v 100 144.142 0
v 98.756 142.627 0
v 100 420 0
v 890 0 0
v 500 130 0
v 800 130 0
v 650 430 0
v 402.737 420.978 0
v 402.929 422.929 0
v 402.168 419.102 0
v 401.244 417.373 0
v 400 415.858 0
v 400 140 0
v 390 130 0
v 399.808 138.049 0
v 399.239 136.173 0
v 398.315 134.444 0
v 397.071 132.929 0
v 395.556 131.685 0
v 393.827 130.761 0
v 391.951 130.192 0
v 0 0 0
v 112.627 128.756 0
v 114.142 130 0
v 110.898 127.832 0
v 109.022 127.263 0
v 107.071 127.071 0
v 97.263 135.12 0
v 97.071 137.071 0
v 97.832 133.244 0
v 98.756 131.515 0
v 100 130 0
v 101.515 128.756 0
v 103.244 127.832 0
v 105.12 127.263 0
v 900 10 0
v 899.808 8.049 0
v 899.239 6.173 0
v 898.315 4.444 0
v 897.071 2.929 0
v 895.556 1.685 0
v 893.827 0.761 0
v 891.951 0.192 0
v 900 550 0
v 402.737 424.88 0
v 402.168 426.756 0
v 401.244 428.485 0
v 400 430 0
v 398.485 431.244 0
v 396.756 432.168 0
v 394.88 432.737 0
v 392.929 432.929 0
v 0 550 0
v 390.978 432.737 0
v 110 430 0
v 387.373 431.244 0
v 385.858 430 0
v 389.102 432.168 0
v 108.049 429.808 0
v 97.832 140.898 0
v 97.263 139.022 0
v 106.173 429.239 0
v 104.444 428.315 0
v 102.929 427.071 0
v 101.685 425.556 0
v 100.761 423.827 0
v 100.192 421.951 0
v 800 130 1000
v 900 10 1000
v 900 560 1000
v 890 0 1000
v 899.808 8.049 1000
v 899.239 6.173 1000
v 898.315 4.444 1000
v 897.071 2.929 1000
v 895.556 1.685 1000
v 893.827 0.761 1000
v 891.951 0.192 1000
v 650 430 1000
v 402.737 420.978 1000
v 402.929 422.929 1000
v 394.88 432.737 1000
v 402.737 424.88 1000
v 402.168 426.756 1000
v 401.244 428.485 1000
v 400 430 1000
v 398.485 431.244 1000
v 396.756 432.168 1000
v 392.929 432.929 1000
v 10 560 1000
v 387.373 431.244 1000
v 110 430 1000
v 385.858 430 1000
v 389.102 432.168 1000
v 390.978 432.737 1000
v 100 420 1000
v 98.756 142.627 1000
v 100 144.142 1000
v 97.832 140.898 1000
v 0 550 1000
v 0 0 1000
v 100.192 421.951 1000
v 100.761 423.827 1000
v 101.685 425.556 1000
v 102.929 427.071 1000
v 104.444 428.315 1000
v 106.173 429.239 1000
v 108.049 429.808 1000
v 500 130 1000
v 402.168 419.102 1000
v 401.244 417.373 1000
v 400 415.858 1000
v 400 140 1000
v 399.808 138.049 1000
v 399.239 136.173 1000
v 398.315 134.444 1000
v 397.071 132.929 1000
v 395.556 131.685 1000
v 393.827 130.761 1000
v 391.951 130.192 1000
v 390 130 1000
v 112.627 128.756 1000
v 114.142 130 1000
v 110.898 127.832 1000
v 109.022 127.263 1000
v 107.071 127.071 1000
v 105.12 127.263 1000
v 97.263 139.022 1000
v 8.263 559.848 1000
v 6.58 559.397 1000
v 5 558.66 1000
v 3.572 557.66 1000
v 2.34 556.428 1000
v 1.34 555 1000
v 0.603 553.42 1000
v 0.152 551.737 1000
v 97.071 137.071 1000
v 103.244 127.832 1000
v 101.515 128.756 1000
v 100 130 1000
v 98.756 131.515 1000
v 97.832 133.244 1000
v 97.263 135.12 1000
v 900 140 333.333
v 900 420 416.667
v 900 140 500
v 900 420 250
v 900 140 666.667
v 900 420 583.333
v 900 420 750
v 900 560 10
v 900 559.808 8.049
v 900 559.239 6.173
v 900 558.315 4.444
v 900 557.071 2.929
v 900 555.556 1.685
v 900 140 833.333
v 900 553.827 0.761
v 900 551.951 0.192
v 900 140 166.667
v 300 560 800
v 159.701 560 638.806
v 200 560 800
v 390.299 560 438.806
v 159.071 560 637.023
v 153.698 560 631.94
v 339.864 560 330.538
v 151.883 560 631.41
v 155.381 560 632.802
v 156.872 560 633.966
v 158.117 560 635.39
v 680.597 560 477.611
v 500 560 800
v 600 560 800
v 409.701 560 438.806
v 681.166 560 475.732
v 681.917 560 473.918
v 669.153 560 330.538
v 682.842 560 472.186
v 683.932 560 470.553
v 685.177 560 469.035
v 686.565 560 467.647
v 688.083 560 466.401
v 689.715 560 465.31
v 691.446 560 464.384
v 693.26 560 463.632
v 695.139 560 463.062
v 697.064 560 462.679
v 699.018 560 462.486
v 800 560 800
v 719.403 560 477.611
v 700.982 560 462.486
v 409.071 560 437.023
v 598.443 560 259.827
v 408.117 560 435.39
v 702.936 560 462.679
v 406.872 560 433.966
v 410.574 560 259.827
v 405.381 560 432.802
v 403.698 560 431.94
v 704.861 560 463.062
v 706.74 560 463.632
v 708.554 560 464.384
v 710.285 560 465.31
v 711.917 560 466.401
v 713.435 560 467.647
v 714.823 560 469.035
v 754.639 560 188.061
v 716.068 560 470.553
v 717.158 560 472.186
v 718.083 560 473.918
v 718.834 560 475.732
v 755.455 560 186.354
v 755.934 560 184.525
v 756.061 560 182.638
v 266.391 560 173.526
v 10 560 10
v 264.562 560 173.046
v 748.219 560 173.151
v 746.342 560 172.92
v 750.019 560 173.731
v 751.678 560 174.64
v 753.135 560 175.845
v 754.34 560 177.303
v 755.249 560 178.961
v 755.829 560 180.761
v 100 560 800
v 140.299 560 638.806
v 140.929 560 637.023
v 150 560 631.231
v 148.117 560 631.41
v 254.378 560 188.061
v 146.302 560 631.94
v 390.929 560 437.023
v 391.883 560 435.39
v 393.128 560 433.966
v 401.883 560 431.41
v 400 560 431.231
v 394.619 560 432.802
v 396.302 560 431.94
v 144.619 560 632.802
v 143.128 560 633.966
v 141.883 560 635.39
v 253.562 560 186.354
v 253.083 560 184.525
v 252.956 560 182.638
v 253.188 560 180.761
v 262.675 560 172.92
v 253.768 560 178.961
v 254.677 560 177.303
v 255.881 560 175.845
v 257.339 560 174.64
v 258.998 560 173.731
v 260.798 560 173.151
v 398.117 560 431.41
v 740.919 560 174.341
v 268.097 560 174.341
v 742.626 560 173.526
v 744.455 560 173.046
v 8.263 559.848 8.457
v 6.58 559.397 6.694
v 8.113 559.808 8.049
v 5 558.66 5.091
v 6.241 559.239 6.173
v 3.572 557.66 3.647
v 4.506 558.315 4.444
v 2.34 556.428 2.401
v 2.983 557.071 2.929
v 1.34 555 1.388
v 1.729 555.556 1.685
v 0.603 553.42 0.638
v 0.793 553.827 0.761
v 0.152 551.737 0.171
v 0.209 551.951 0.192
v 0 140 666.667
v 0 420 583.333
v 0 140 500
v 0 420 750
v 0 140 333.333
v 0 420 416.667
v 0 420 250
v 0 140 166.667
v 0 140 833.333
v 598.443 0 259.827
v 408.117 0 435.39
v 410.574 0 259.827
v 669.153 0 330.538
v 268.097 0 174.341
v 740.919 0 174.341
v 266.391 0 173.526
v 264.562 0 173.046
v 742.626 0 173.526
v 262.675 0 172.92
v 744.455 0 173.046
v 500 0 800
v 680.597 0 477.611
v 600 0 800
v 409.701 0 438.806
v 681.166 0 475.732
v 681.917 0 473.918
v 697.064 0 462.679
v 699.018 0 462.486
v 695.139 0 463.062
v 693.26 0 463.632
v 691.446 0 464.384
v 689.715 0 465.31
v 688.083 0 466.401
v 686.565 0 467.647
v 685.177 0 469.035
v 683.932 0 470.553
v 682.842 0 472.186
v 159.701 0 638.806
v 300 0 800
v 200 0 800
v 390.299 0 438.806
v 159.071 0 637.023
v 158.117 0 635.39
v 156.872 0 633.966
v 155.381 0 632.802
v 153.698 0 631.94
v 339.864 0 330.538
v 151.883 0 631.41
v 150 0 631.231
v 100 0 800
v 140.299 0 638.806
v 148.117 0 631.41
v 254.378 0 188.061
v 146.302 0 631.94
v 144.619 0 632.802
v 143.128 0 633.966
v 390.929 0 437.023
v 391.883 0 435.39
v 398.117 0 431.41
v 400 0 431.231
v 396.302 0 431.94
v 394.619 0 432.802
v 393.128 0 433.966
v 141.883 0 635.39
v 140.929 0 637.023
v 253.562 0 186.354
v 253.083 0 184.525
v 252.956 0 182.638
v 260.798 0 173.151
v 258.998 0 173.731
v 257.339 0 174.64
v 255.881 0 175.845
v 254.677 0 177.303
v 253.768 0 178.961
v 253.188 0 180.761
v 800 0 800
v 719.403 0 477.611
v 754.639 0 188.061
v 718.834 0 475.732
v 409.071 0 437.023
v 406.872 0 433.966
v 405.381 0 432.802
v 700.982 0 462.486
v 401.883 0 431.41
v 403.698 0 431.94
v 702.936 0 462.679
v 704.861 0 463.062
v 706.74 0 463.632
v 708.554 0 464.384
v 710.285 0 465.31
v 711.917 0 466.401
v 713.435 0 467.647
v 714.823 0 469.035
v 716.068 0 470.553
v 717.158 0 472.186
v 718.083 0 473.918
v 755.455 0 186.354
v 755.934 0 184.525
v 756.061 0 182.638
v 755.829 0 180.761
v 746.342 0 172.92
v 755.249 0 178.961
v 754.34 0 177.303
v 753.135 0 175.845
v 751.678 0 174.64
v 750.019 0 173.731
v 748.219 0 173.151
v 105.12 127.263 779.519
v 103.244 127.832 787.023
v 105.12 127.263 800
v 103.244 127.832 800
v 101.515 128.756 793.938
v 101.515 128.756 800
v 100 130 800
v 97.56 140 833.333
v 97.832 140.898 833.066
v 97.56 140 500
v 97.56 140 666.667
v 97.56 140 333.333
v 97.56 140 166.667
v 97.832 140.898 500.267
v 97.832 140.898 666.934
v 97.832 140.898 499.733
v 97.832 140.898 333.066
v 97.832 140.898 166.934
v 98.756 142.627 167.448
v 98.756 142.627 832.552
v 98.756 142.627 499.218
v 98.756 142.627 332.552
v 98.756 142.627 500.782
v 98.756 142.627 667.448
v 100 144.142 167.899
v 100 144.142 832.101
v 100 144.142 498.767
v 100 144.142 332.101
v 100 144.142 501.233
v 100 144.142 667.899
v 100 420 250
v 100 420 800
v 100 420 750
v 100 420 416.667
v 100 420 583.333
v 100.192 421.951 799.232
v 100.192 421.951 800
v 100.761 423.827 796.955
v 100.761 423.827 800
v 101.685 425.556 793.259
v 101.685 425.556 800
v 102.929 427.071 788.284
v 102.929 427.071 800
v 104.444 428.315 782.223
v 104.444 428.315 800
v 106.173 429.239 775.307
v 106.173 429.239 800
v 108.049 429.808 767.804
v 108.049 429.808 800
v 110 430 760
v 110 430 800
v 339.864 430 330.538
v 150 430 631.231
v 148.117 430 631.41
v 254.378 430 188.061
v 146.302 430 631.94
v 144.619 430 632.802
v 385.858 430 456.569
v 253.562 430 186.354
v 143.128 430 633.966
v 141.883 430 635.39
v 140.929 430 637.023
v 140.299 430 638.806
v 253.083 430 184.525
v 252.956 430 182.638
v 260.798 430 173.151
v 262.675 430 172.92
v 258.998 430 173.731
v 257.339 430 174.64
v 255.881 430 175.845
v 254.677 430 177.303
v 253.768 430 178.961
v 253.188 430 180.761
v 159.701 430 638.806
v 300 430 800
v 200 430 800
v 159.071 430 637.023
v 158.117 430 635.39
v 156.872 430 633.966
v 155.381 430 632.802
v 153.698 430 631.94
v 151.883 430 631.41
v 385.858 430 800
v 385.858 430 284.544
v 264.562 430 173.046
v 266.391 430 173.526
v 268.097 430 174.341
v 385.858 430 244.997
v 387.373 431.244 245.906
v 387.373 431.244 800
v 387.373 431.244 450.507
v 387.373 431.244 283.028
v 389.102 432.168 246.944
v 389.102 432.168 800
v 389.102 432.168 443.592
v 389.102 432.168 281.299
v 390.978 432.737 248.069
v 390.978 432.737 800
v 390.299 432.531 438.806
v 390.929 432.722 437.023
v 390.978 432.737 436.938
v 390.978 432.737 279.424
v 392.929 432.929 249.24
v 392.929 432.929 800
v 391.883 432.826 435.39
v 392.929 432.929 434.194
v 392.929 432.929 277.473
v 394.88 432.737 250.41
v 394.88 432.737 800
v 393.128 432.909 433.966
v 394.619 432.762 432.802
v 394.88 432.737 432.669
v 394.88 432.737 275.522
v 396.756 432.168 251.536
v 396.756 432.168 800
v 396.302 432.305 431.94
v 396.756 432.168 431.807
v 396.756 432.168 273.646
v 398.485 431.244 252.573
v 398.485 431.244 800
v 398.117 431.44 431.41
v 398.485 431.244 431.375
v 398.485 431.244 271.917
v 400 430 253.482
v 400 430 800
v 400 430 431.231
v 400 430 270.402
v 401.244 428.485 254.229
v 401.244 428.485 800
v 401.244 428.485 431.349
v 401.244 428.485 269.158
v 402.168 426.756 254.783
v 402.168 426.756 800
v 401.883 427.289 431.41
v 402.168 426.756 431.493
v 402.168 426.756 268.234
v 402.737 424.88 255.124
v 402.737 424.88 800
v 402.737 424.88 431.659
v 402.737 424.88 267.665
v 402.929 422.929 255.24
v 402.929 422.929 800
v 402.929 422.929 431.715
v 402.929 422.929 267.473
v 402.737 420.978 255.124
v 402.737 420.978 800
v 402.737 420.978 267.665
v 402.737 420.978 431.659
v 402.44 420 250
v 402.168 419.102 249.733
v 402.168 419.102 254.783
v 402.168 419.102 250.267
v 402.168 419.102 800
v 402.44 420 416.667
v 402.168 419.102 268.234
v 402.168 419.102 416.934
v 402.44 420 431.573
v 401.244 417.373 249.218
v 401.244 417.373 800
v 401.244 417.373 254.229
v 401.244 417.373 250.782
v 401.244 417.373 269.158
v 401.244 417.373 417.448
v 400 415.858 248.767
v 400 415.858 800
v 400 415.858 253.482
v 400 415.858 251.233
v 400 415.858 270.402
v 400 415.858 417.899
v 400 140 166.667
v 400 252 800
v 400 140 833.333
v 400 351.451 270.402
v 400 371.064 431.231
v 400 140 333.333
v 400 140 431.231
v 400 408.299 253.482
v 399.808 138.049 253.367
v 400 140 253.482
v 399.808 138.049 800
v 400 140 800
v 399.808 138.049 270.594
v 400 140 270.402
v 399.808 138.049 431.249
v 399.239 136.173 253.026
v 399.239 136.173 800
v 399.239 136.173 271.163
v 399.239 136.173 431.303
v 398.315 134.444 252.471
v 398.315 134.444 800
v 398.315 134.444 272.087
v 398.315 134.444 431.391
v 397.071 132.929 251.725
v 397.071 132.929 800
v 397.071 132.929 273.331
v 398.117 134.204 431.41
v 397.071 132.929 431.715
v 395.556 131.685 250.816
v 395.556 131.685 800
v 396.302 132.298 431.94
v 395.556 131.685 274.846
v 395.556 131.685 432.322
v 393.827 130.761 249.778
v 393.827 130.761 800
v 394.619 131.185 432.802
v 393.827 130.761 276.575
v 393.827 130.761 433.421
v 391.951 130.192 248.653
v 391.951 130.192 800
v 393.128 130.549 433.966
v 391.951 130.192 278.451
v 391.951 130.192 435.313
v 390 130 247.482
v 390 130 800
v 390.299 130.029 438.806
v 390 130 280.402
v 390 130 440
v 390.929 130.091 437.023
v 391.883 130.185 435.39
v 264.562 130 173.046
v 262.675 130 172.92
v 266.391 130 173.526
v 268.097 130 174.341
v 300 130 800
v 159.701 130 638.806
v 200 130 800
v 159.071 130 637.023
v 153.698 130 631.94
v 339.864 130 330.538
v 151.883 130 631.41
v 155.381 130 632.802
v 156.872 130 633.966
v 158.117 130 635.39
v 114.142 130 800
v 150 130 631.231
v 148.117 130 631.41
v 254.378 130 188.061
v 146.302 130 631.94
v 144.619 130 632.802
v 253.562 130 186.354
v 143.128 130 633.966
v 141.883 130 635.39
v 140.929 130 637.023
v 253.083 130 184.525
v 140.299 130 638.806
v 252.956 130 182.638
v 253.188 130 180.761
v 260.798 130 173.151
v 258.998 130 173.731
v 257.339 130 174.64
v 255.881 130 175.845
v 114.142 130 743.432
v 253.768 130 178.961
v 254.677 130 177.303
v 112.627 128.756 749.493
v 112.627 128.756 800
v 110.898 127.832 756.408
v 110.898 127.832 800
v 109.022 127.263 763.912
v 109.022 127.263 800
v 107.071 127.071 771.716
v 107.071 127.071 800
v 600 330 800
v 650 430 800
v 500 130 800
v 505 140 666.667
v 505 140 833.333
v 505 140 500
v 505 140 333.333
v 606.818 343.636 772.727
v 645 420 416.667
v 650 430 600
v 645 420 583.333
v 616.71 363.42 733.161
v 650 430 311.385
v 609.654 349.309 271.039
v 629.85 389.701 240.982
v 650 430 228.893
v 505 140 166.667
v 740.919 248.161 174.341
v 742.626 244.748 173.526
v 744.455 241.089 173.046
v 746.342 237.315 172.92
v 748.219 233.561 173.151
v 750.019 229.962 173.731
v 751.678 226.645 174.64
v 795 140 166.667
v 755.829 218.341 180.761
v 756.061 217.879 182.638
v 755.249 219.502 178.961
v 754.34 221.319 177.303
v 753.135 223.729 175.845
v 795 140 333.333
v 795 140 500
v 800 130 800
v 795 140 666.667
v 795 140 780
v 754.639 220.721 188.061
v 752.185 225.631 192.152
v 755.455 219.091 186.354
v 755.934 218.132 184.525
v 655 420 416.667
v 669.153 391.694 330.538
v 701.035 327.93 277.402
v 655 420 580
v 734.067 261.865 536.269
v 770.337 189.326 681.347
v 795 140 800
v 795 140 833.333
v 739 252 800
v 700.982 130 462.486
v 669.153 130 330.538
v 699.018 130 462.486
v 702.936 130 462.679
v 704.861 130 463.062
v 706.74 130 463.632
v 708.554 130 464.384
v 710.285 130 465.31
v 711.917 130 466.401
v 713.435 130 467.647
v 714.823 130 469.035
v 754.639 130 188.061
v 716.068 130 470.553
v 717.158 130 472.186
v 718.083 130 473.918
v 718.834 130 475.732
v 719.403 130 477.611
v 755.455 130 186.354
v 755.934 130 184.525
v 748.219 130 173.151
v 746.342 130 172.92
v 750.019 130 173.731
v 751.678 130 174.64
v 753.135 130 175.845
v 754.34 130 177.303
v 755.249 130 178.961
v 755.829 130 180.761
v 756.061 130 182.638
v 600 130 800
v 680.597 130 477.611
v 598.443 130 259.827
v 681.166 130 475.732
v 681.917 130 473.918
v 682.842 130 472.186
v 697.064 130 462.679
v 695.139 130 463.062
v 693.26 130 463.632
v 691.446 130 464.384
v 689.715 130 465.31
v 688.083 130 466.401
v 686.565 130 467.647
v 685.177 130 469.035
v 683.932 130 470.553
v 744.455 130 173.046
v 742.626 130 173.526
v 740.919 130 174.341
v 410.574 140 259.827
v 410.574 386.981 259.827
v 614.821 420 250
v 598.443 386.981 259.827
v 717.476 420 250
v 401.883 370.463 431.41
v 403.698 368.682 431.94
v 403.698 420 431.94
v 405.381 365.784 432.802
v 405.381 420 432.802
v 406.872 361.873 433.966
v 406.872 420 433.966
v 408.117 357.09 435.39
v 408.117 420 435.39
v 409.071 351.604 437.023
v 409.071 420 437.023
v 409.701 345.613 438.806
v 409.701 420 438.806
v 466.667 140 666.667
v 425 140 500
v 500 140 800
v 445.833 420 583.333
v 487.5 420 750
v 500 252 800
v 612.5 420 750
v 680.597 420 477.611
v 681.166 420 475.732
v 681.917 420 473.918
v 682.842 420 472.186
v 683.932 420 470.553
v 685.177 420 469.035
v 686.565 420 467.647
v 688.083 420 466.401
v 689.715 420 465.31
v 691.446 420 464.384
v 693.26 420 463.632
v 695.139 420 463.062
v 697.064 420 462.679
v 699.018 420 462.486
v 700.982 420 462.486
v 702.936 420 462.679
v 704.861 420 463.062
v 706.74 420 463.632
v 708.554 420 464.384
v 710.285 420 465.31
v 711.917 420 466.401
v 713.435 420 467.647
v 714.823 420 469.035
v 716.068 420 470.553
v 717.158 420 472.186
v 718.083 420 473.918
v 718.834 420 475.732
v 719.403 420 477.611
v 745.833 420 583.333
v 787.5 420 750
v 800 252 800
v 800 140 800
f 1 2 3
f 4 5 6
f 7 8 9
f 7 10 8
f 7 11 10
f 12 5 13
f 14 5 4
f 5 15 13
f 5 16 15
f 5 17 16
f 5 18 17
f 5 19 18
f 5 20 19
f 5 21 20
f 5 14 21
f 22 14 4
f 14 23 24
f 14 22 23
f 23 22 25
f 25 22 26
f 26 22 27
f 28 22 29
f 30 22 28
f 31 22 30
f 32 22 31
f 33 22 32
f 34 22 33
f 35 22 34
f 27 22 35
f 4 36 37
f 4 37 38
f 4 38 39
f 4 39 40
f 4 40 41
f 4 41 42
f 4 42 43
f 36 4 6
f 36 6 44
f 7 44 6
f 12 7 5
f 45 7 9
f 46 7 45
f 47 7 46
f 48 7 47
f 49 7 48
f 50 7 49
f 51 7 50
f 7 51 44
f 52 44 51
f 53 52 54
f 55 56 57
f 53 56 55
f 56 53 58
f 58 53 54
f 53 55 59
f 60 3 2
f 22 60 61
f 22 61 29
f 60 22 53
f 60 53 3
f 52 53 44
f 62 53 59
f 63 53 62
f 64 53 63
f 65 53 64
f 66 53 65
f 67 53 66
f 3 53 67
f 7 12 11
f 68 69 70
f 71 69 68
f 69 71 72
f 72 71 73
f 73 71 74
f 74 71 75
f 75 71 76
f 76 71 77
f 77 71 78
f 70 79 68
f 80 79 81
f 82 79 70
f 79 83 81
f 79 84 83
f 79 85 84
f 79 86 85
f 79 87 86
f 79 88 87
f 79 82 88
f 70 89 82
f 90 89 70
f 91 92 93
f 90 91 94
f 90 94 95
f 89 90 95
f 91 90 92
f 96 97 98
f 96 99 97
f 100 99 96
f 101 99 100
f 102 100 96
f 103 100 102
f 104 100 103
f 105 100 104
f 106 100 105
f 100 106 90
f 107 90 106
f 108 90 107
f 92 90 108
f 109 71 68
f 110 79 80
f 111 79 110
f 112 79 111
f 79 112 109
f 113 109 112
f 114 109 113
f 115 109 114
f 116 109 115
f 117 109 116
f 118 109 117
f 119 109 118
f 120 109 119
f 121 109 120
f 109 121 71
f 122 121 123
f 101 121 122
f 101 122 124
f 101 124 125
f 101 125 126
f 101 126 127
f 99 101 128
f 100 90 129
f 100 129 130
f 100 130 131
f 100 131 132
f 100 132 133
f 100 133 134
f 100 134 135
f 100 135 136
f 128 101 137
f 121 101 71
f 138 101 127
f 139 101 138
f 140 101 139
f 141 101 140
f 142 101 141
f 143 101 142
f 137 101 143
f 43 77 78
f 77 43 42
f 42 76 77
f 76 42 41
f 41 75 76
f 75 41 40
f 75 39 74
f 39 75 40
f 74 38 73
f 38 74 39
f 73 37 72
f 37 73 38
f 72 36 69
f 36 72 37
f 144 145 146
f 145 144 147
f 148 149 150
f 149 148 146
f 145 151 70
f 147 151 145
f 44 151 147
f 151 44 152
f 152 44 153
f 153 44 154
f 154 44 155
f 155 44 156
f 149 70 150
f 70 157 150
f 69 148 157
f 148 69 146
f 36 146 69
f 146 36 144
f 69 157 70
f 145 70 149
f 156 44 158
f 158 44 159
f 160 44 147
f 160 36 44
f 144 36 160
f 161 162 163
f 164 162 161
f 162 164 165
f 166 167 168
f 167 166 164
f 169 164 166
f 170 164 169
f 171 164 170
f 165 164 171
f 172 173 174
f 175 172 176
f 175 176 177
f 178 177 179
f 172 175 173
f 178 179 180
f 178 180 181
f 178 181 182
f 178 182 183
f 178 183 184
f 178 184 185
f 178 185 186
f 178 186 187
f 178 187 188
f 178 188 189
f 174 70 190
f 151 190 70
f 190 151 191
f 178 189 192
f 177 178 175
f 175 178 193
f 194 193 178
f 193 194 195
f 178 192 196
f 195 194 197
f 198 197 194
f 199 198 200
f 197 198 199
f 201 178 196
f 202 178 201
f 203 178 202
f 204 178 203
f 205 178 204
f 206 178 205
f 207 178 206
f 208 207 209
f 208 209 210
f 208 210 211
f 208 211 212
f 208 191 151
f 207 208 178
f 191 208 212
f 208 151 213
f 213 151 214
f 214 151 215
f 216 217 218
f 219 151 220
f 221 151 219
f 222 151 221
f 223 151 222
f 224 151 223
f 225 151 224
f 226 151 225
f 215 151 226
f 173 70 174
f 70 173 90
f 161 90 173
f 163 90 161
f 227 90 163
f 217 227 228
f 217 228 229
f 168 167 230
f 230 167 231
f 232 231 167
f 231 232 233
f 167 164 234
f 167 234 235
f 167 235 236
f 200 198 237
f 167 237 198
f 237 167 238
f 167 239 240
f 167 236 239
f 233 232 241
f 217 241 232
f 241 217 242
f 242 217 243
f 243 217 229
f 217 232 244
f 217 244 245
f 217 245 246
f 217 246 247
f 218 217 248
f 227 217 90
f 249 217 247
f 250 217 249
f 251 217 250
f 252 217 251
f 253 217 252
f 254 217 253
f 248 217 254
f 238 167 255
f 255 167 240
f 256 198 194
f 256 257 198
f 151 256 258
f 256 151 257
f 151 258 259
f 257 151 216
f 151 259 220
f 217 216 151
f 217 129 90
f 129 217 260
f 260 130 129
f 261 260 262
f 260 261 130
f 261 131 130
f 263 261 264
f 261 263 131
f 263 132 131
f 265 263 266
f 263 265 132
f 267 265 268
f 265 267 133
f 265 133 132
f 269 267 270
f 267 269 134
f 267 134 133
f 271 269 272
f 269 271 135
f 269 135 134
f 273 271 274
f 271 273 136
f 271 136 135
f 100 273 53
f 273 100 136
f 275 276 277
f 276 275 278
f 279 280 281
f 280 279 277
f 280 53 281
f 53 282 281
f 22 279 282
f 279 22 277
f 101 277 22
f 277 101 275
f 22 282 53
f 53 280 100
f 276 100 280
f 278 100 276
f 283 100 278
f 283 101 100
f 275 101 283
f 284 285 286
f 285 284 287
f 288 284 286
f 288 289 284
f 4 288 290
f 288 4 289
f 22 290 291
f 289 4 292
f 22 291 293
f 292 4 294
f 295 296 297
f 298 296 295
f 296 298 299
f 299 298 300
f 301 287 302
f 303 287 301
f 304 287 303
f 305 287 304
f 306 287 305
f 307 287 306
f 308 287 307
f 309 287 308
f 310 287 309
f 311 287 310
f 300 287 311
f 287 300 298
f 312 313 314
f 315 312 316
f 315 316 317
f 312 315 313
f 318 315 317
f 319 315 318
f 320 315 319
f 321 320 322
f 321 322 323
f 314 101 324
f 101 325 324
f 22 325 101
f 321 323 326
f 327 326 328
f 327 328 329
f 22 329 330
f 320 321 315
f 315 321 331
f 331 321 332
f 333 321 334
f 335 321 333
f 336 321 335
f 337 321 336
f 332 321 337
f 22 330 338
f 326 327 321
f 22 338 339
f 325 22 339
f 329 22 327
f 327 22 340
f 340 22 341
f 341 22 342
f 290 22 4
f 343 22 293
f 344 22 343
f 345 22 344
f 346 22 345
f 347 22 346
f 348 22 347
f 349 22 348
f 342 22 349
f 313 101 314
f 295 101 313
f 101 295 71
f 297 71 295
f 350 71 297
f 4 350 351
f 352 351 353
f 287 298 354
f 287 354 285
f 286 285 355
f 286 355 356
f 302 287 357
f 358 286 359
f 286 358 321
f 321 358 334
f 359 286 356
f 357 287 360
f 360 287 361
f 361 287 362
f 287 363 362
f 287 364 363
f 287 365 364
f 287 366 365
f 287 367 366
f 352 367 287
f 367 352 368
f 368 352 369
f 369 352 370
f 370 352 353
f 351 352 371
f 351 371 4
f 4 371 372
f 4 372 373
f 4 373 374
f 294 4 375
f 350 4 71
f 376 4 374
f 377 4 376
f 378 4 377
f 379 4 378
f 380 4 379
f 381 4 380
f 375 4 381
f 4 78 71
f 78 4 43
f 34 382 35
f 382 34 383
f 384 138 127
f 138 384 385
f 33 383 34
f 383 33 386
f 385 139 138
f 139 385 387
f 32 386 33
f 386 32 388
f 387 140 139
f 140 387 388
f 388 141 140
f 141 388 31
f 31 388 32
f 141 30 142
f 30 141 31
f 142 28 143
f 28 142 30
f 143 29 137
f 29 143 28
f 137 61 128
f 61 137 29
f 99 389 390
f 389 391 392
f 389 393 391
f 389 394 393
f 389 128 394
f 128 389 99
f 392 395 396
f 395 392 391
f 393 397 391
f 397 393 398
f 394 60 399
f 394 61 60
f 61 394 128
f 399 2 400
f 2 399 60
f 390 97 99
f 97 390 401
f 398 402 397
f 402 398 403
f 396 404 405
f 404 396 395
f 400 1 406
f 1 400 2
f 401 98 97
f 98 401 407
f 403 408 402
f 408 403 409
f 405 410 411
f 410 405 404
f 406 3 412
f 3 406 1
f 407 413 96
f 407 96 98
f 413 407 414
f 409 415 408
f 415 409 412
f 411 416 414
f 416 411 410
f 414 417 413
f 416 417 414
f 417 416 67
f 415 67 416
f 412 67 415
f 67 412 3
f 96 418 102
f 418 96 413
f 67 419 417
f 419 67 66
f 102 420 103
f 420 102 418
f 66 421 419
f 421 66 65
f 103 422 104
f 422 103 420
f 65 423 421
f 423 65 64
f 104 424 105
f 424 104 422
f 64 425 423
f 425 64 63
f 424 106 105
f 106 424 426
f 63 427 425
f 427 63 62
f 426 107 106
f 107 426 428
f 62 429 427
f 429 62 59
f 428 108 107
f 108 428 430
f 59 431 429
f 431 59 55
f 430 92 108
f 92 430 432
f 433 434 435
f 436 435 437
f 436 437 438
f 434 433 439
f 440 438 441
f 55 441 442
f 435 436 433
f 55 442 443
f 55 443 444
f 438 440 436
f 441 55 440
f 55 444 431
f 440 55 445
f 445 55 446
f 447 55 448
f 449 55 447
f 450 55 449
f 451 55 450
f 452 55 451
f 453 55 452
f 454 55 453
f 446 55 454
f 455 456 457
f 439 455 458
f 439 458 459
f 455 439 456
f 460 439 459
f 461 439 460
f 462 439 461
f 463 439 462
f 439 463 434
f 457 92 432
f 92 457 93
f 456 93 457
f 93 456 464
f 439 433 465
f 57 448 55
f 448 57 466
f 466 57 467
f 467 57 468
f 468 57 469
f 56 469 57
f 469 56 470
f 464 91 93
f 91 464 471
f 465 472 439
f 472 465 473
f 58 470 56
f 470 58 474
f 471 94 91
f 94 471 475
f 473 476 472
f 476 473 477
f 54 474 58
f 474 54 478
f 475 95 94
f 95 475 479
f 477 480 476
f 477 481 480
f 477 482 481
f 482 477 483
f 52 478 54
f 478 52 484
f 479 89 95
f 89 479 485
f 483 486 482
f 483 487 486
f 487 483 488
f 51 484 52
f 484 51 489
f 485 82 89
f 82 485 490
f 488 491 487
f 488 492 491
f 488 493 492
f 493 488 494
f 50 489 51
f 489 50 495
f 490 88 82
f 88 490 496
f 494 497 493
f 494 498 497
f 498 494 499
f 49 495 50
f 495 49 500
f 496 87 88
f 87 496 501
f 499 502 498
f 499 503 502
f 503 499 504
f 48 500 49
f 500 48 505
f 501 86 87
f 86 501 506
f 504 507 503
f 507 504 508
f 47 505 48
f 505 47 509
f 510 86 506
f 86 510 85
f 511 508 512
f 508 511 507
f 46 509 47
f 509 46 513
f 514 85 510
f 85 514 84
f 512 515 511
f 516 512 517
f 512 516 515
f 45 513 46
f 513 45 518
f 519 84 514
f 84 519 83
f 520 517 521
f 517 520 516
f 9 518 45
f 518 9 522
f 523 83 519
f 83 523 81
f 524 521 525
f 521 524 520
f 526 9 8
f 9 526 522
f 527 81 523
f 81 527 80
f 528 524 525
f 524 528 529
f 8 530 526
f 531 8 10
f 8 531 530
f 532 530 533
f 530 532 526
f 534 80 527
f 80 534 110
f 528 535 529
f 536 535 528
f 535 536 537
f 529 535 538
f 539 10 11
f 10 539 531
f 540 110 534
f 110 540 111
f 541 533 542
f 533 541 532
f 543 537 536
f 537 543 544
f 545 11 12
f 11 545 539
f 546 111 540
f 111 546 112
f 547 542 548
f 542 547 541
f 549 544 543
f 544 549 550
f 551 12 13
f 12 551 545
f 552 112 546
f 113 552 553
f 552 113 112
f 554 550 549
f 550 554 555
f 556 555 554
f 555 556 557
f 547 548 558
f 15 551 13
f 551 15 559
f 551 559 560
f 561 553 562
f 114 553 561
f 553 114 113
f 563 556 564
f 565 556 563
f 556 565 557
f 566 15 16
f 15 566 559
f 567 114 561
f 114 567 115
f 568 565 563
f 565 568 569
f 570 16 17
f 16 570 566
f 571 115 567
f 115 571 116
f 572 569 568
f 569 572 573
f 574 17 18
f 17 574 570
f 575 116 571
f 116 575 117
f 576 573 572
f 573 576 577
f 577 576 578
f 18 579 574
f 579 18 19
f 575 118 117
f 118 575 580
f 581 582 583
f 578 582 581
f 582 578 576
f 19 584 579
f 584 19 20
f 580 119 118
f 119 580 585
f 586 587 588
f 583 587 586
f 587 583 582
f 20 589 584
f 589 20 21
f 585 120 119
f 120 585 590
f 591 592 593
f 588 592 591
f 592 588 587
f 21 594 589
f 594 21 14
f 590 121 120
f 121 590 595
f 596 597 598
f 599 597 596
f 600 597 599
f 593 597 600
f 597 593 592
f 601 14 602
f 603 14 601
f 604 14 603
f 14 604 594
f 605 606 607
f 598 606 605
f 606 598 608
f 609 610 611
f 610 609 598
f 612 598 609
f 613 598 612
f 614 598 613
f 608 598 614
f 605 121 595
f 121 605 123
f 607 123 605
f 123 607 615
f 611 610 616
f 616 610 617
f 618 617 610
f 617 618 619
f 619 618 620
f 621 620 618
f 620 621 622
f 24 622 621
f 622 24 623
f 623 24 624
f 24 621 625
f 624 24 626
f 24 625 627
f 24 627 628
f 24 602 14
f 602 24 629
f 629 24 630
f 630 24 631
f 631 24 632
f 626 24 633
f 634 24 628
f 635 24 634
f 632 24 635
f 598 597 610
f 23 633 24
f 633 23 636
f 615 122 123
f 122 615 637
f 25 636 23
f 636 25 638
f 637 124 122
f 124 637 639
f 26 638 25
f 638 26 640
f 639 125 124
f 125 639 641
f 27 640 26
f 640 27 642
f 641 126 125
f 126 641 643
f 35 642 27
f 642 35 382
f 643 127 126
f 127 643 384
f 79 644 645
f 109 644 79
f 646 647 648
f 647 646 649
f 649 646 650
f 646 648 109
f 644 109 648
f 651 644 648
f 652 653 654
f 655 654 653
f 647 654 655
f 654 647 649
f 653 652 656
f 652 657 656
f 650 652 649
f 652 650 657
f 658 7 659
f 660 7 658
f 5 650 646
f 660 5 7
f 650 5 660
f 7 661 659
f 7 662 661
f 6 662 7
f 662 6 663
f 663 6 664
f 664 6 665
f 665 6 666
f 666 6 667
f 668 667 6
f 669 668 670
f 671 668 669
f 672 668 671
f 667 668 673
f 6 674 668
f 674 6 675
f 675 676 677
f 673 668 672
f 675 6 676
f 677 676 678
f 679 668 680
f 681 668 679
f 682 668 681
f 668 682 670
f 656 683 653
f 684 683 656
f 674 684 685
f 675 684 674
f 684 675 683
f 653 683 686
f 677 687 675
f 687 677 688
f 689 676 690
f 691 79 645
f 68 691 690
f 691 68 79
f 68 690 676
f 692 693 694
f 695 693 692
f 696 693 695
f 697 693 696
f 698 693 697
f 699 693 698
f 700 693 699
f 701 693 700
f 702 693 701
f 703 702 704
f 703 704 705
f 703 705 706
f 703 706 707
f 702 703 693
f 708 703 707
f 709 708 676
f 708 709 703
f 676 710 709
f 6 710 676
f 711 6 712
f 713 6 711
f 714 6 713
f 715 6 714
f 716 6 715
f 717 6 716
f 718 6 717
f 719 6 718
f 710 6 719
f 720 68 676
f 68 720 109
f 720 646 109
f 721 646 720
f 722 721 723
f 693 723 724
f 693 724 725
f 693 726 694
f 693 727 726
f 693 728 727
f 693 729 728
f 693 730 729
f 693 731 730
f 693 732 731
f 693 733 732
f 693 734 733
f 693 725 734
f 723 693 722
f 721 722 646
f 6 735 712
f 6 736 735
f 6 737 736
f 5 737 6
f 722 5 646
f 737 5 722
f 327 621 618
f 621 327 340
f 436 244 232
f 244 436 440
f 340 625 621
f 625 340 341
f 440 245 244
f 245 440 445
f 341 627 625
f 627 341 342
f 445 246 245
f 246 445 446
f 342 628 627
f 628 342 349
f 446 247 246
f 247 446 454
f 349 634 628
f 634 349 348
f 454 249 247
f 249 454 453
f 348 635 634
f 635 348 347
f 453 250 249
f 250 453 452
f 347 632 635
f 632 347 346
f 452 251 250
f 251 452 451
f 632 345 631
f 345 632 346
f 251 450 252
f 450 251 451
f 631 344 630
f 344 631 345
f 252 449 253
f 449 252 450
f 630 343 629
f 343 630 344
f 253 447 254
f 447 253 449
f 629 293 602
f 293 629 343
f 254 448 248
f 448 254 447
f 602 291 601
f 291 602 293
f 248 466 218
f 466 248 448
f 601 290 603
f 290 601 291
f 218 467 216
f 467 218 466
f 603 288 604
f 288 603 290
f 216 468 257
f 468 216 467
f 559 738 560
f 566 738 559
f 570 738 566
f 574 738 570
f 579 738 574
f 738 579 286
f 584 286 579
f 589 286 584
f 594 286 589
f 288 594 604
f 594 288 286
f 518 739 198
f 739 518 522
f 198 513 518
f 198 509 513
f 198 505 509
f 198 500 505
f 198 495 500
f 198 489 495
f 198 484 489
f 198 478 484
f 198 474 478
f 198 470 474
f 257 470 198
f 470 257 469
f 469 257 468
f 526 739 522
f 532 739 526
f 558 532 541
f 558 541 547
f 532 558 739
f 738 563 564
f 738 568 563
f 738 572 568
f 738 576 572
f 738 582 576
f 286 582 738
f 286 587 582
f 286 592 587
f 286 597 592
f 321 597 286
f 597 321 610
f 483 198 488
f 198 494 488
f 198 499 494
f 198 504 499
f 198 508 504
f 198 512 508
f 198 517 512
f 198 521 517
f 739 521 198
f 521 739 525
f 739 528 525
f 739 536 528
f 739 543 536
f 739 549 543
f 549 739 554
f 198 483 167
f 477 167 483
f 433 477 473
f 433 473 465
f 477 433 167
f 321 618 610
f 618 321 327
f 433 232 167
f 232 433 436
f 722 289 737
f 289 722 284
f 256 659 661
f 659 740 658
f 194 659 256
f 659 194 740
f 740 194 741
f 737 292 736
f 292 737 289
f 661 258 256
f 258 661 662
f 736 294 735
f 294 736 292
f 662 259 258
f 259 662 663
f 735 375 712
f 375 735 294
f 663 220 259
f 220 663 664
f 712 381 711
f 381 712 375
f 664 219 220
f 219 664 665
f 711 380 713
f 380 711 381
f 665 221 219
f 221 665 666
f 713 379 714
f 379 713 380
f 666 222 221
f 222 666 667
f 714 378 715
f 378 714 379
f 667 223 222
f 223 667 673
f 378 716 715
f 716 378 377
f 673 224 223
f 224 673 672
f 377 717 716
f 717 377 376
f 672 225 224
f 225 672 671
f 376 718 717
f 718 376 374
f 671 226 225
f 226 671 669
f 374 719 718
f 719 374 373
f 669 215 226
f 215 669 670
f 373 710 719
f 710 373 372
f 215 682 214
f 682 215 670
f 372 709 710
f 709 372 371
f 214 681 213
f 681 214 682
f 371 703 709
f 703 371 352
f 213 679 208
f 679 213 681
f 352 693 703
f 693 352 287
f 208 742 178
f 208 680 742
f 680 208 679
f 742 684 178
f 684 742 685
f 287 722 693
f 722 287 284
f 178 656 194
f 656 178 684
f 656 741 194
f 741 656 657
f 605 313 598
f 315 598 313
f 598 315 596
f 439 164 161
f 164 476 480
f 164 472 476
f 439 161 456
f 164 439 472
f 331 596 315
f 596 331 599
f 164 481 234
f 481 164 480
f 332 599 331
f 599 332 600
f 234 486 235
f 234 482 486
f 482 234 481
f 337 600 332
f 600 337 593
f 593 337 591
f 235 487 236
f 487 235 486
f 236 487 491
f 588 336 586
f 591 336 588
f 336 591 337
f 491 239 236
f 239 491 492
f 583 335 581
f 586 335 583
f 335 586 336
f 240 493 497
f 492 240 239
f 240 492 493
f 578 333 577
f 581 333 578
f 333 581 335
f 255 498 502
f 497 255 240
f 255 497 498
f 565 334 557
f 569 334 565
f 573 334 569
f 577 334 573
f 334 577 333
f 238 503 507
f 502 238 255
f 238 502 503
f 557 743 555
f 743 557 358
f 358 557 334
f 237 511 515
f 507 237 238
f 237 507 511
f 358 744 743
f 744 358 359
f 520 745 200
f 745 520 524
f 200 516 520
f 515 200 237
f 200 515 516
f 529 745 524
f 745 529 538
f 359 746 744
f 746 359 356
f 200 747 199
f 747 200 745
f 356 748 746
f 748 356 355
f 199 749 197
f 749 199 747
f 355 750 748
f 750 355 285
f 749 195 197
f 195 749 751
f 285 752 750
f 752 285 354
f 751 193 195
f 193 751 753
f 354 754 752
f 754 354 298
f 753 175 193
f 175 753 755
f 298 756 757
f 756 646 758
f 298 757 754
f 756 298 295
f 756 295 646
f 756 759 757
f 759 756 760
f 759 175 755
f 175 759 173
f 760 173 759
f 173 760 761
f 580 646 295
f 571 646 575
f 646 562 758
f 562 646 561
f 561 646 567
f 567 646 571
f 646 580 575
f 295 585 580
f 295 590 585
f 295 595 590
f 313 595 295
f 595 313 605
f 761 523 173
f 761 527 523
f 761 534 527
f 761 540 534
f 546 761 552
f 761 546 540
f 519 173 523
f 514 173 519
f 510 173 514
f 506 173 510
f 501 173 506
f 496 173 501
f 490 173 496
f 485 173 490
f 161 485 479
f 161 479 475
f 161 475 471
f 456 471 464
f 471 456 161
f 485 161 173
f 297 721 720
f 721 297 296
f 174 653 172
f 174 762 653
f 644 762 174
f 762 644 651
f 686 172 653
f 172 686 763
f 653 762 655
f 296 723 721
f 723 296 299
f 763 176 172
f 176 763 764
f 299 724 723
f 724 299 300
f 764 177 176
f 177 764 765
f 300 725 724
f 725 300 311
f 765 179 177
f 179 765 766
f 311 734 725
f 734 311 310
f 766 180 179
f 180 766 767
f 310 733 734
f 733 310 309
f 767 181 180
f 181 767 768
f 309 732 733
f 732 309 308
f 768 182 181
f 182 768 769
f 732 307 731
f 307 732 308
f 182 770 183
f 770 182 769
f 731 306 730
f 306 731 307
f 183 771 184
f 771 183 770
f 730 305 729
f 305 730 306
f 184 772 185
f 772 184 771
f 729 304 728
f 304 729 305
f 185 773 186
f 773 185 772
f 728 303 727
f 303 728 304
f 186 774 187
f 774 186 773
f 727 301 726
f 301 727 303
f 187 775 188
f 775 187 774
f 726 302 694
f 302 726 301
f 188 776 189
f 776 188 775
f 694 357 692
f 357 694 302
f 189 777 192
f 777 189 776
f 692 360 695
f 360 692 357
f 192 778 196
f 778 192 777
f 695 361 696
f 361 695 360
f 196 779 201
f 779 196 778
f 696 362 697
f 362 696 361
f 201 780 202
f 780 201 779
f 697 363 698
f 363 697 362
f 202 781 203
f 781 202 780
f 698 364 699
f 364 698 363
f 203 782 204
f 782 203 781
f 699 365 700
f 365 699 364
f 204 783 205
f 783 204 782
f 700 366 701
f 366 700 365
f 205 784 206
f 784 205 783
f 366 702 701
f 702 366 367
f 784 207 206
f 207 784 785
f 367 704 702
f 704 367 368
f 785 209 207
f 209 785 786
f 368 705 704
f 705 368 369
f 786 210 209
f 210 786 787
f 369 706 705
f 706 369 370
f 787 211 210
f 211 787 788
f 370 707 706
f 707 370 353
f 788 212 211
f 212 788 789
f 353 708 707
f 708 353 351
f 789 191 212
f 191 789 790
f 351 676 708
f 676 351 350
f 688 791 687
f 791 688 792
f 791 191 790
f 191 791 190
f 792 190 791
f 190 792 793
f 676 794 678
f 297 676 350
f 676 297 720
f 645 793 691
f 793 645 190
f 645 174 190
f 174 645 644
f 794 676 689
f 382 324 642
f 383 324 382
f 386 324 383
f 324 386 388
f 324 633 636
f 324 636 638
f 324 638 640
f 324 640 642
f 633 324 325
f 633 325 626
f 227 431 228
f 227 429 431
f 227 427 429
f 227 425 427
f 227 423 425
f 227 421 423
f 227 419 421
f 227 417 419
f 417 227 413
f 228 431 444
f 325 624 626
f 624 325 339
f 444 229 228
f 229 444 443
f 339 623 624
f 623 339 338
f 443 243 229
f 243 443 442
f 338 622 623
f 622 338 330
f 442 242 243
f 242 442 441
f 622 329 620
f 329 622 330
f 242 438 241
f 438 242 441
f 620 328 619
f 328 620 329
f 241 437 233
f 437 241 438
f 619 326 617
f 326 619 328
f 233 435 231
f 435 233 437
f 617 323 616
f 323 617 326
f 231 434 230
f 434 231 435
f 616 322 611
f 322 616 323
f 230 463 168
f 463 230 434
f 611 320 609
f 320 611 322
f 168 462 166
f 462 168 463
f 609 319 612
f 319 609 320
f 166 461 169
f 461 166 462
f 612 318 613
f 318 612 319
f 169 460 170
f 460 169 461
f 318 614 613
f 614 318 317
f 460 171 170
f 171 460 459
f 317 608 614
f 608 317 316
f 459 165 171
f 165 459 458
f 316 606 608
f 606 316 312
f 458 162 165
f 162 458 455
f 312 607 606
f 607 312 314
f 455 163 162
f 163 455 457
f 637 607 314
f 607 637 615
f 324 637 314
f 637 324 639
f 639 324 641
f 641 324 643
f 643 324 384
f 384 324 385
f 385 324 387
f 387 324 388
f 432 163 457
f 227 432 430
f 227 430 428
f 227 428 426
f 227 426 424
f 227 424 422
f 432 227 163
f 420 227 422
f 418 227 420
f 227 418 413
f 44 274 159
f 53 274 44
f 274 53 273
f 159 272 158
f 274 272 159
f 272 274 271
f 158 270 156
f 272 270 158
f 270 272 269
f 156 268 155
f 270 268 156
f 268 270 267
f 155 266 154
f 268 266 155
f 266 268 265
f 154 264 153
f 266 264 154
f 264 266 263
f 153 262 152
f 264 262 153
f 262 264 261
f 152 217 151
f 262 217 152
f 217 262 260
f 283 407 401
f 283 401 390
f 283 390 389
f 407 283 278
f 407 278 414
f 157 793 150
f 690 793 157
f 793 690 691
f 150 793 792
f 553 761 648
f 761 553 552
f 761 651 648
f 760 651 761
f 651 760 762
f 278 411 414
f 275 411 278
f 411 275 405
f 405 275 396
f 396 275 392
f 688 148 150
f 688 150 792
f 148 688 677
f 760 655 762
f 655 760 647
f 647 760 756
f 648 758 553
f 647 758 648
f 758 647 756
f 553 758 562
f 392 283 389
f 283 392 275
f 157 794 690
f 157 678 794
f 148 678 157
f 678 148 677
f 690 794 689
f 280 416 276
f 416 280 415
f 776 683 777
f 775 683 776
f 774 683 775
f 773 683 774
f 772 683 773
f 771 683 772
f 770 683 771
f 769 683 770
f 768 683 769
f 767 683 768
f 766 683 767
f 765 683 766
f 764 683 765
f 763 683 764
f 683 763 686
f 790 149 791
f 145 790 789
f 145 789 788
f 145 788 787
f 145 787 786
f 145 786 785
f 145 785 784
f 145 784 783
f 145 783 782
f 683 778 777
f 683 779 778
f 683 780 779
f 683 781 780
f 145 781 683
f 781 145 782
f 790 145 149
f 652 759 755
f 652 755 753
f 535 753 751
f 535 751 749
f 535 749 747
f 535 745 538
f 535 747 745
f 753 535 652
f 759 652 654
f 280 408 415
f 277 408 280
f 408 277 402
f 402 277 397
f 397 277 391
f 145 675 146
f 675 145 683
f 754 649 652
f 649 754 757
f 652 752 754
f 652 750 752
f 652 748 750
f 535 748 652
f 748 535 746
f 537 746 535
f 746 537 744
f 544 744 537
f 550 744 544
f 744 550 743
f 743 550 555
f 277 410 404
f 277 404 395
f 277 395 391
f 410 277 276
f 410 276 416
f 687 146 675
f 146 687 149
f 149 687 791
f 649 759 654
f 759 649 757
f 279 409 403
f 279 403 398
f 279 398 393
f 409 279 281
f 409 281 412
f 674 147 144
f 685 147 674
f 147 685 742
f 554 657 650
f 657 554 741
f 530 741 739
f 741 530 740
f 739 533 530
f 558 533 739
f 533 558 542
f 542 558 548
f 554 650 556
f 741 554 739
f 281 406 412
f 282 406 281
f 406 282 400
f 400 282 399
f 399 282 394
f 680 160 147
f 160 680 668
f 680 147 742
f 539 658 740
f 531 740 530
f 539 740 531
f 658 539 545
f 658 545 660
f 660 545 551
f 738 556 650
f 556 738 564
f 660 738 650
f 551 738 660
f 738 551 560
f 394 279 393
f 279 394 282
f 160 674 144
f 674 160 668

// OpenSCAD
// Generated by Parametrix
ca_myPartJ_face1_000 = [ [ 0.0000, 0.0000 ],[ 890.0000, 0.0000 ],[ 891.9509, 0.1921 ],[ 893.8268, 0.7612 ],[ 895.5557, 1.6853 ],[ 897.0711, 2.9289 ],[ 898.3147, 4.4443 ],[ 899.2388, 6.1732 ],[ 899.8079, 8.0491 ],[ 900.0000, 10.0000 ],[ 900.0000, 560.0000 ],[ 10.0000, 560.0000 ],[ 8.2635, 559.8481 ],[ 6.5798, 559.3969 ],[ 5.0000, 558.6603 ],[ 3.5721, 557.6604 ],[ 2.3396, 556.4279 ],[ 1.3397, 555.0000 ],[ 0.6031, 553.4202 ],[ 0.1519, 551.7365 ],[ 0.0000, 550.0000 ],[ 0.0000, 0.0000 ] ];
cb_myPartJ_face1_000 = [  0, 1, 2, 3, 4, 5, 6, 7, 8, 9, 10, 11, 12, 13, 14, 15, 16, 17, 18, 19, 20, 21 ];
ca_myPartJ_face1_001 = [ [ 114.1421, 130.0000 ],[ 390.0000, 130.0000 ],[ 391.9509, 130.1921 ],[ 393.8268, 130.7612 ],[ 395.5557, 131.6853 ],[ 397.0711, 132.9289 ],[ 398.3147, 134.4443 ],[ 399.2388, 136.1732 ],[ 399.8079, 138.0491 ],[ 400.0000, 140.0000 ],[ 400.0000, 415.8579 ],[ 401.2436, 417.3732 ],[ 402.1677, 419.1021 ],[ 402.7368, 420.9780 ],[ 402.9289, 422.9289 ],[ 402.7368, 424.8798 ],[ 402.1677, 426.7558 ],[ 401.2436, 428.4846 ],[ 400.0000, 430.0000 ],[ 398.4846, 431.2436 ],[ 396.7558, 432.1677 ],[ 394.8798, 432.7368 ],[ 392.9289, 432.9289 ],[ 390.9780, 432.7368 ],[ 389.1021, 432.1677 ],[ 387.3732, 431.2436 ],[ 385.8579, 430.0000 ],[ 110.0000, 430.0000 ],[ 108.0491, 429.8079 ],[ 106.1732, 429.2388 ],[ 104.4443, 428.3147 ],[ 102.9289, 427.0711 ],[ 101.6853, 425.5557 ],[ 100.7612, 423.8268 ],[ 100.1921, 421.9509 ],[ 100.0000, 420.0000 ],[ 100.0000, 144.1421 ],[ 98.7564, 142.6268 ],[ 97.8323, 140.8979 ],[ 97.2632, 139.0220 ],[ 97.0711, 137.0711 ],[ 97.2632, 135.1202 ],[ 97.8323, 133.2442 ],[ 98.7564, 131.5154 ],[ 100.0000, 130.0000 ],[ 101.5154, 128.7564 ],[ 103.2442, 127.8323 ],[ 105.1202, 127.2632 ],[ 107.0711, 127.0711 ],[ 109.0220, 127.2632 ],[ 110.8979, 127.8323 ],[ 112.6268, 128.7564 ],[ 114.1421, 130.0000 ] ];
cb_myPartJ_face1_001 = [  22, 23, 24, 25, 26, 27, 28, 29, 30, 31, 32, 33, 34, 35, 36, 37, 38, 39, 40, 41, 42, 43, 44, 45, 46, 47, 48, 49, 50, 51, 52, 53, 54, 55, 56, 57, 58, 59, 60, 61, 62, 63, 64, 65, 66, 67, 68, 69, 70, 71, 72, 73, 74 ];
ca_myPartJ_face1_002 = [ [ 500.0000, 130.0000 ],[ 800.0000, 130.0000 ],[ 650.0000, 430.0000 ],[ 500.0000, 130.0000 ] ];
cb_myPartJ_face1_002 = [  75, 76, 77, 78 ];
a_myPartJ_face1 = concat(ca_myPartJ_face1_000, ca_myPartJ_face1_001, ca_myPartJ_face1_002);
b_myPartJ_face1 = [cb_myPartJ_face1_000, cb_myPartJ_face1_001, cb_myPartJ_face1_002];
ca_myPartJ_face2_000 = [ [ 0.0000, 0.0000 ],[ 900.0000, 0.0000 ],[ 900.0000, 1000.0000 ],[ 0.0000, 1000.0000 ],[ 0.0000, 0.0000 ] ];
cb_myPartJ_face2_000 = [  0, 1, 2, 3, 4 ];
ca_myPartJ_face2_001 = [ [ 100.0000, 200.0000 ],[ 200.0000, 200.0000 ],[ 159.7014, 361.1943 ],[ 159.0713, 362.9774 ],[ 158.1167, 364.6100 ],[ 156.8719, 366.0337 ],[ 155.3812, 367.1976 ],[ 153.6981, 368.0600 ],[ 151.8827, 368.5901 ],[ 150.0000, 368.7689 ],[ 148.1173, 368.5901 ],[ 146.3019, 368.0600 ],[ 144.6188, 367.1976 ],[ 143.1281, 366.0337 ],[ 141.8833, 364.6100 ],[ 140.9287, 362.9774 ],[ 140.2986, 361.1943 ],[ 100.0000, 200.0000 ] ];
cb_myPartJ_face2_001 = [  5, 6, 7, 8, 9, 10, 11, 12, 13, 14, 15, 16, 17, 18, 19, 20, 21, 22 ];
ca_myPartJ_face2_002 = [ [ 300.0000, 200.0000 ],[ 500.0000, 200.0000 ],[ 409.7014, 561.1943 ],[ 409.0713, 562.9774 ],[ 408.1167, 564.6100 ],[ 406.8719, 566.0337 ],[ 405.3812, 567.1976 ],[ 403.6981, 568.0600 ],[ 401.8827, 568.5901 ],[ 400.0000, 568.7689 ],[ 398.1173, 568.5901 ],[ 396.3019, 568.0600 ],[ 394.6188, 567.1976 ],[ 393.1281, 566.0337 ],[ 391.8833, 564.6100 ],[ 390.9287, 562.9774 ],[ 390.2986, 561.1943 ],[ 300.0000, 200.0000 ] ];
cb_myPartJ_face2_002 = [  23, 24, 25, 26, 27, 28, 29, 30, 31, 32, 33, 34, 35, 36, 37, 38, 39, 40 ];
ca_myPartJ_face2_003 = [ [ 600.0000, 200.0000 ],[ 800.0000, 200.0000 ],[ 719.4029, 522.3886 ],[ 718.8337, 524.2677 ],[ 718.0831, 526.0819 ],[ 717.1582, 527.8138 ],[ 716.0680, 529.4467 ],[ 714.8229, 530.9648 ],[ 713.4350, 532.3535 ],[ 711.9175, 533.5994 ],[ 710.2853, 534.6905 ],[ 708.5539, 535.6164 ],[ 706.7400, 536.3680 ],[ 704.8612, 536.9381 ],[ 702.9356, 537.3213 ],[ 700.9817, 537.5138 ],[ 699.0183, 537.5138 ],[ 697.0644, 537.3213 ],[ 695.1388, 536.9381 ],[ 693.2600, 536.3680 ],[ 691.4461, 535.6164 ],[ 689.7147, 534.6905 ],[ 688.0825, 533.5994 ],[ 686.5650, 532.3535 ],[ 685.1771, 530.9648 ],[ 683.9320, 529.4467 ],[ 682.8418, 527.8138 ],[ 681.9169, 526.0819 ],[ 681.1663, 524.2677 ],[ 680.5971, 522.3886 ],[ 600.0000, 200.0000 ] ];
cb_myPartJ_face2_003 = [  41, 42, 43, 44, 45, 46, 47, 48, 49, 50, 51, 52, 53, 54, 55, 56, 57, 58, 59, 60, 61, 62, 63, 64, 65, 66, 67, 68, 69, 70, 71 ];
ca_myPartJ_face2_004 = [ [ 339.8638, 669.4622 ],[ 410.5745, 740.1729 ],[ 268.0975, 825.6591 ],[ 266.3911, 826.4744 ],[ 264.5617, 826.9539 ],[ 262.6747, 827.0803 ],[ 260.7977, 826.8492 ],[ 258.9978, 826.2689 ],[ 257.3392, 825.3601 ],[ 255.8815, 824.1552 ],[ 254.6767, 822.6975 ],[ 253.7678, 821.0390 ],[ 253.1875, 819.2390 ],[ 252.9564, 817.3620 ],[ 253.0829, 815.4751 ],[ 253.5623, 813.6456 ],[ 254.3776, 811.9392 ],[ 339.8638, 669.4622 ] ];
cb_myPartJ_face2_004 = [  72, 73, 74, 75, 76, 77, 78, 79, 80, 81, 82, 83, 84, 85, 86, 87, 88, 89 ];
ca_myPartJ_face2_005 = [ [ 598.4425, 740.1729 ],[ 669.1532, 669.4622 ],[ 754.6393, 811.9392 ],[ 755.4547, 813.6456 ],[ 755.9341, 815.4751 ],[ 756.0606, 817.3620 ],[ 755.8295, 819.2390 ],[ 755.2492, 821.0390 ],[ 754.3403, 822.6975 ],[ 753.1355, 824.1552 ],[ 751.6777, 825.3601 ],[ 750.0192, 826.2689 ],[ 748.2193, 826.8492 ],[ 746.3423, 827.0803 ],[ 744.4553, 826.9539 ],[ 742.6259, 826.4744 ],[ 740.9195, 825.6591 ],[ 598.4425, 740.1729 ] ];
cb_myPartJ_face2_005 = [  90, 91, 92, 93, 94, 95, 96, 97, 98, 99, 100, 101, 102, 103, 104, 105, 106, 107 ];
a_myPartJ_face2 = concat(ca_myPartJ_face2_000, ca_myPartJ_face2_001, ca_myPartJ_face2_002, ca_myPartJ_face2_003, ca_myPartJ_face2_004, ca_myPartJ_face2_005);
b_myPartJ_face2 = [cb_myPartJ_face2_000, cb_myPartJ_face2_001, cb_myPartJ_face2_002, cb_myPartJ_face2_003, cb_myPartJ_face2_004, cb_myPartJ_face2_005];
ca_myPartJ_face3_000 = [ [ 0.0000, 0.0000 ],[ 1000.0000, -0.0000 ],[ 1000.0000, 550.0000 ],[ 999.8079, 551.9509 ],[ 999.2388, 553.8268 ],[ 998.3147, 555.5557 ],[ 997.0711, 557.0711 ],[ 995.5557, 558.3147 ],[ 993.8268, 559.2388 ],[ 991.9509, 559.8079 ],[ 990.0000, 560.0000 ],[ 0.0000, 560.0000 ],[ 0.0000, 0.0000 ] ];
cb_myPartJ_face3_000 = [  0, 1, 2, 3, 4, 5, 6, 7, 8, 9, 10, 11, 12 ];
ca_myPartJ_face3_001 = [ [ 166.6667, 140.0000 ],[ 333.3333, 140.0000 ],[ 250.0000, 420.0000 ],[ 166.6667, 140.0000 ] ];
cb_myPartJ_face3_001 = [  13, 14, 15, 16 ];
ca_myPartJ_face3_002 = [ [ 583.3333, 420.0000 ],[ 416.6667, 420.0000 ],[ 500.0000, 140.0000 ],[ 583.3333, 420.0000 ] ];
cb_myPartJ_face3_002 = [  17, 18, 19, 20 ];
ca_myPartJ_face3_003 = [ [ 666.6667, 140.0000 ],[ 833.3333, 140.0000 ],[ 750.0000, 420.0000 ],[ 666.6667, 140.0000 ] ];
cb_myPartJ_face3_003 = [  21, 22, 23, 24 ];
a_myPartJ_face3 = concat(ca_myPartJ_face3_000, ca_myPartJ_face3_001, ca_myPartJ_face3_002, ca_myPartJ_face3_003);
b_myPartJ_face3 = [cb_myPartJ_face3_000, cb_myPartJ_face3_001, cb_myPartJ_face3_002, cb_myPartJ_face3_003];

module subpax_myPartJ_1 () {
	translate( [ 0, 0, 0 ])
		rotate( [ 0, 0, 0 ])
			   linear_extrude(height = 1000) polygon(a_myPartJ_face1, b_myPartJ_face1);
}

module subpax_myPartJ_2 () {
	translate( [ 0, 0, 1000 ])
		rotate( [ -90, 0, 0 ])
			   linear_extrude(height = 560) polygon(a_myPartJ_face2, b_myPartJ_face2);
}

module subpax_myPartJ_3 () {
	translate( [ 0, 0, 1000 ])
		rotate( [ 0, 90, 0 ])
			   linear_extrude(height = 900) polygon(a_myPartJ_face3, b_myPartJ_face3);
}

module pax_myPartJ () {
	intersection () {
		subpax_myPartJ_1();
subpax_myPartJ_2();
subpax_myPartJ_3();
	}
}

pax_myPartJ();
